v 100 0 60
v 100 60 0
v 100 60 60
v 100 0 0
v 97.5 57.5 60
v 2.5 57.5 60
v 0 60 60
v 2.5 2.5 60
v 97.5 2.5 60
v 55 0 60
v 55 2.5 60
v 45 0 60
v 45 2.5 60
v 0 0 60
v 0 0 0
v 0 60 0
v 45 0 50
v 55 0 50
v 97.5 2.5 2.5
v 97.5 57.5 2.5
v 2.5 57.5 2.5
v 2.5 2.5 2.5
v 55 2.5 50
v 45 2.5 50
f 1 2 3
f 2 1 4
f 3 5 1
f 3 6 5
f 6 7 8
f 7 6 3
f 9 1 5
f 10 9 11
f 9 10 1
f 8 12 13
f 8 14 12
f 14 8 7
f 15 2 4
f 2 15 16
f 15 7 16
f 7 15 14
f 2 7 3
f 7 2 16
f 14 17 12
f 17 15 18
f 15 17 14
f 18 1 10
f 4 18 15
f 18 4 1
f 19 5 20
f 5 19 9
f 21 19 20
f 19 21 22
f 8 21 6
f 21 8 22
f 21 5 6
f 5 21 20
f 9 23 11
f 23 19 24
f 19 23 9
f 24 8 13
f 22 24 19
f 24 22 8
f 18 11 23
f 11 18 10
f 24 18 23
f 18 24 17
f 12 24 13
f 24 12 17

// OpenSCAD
$fn = 32;

// ----------------------------------------------------------------------
// Enclosure box: notch enclosure
// ----------------------------------------------------------------------

// --- parameters (mm) ---
box_l = 100;              // outer length, X
box_w = 60;               // outer width, Y
box_h = 60;               // outer height
wall_t = 2.5;             // wall thickness
notch_w = 10;             // cable notch width
notch_h = 10;             // cable notch height

inner_h = box_h - wall_t;  // cavity depth
boss_h = inner_h - 2;  // corner boss height

difference() {
  union() {
    difference() {
      cube([box_l, box_w, box_h]);
      translate([wall_t, wall_t, wall_t])
        cube([box_l - 2 * wall_t, box_w - 2 * wall_t, box_h]);
    }
  }
  translate([box_l / 2 - notch_w / 2, -1, box_h - notch_h])
    cube([notch_w, wall_t + 2, notch_h + 1]);
}
